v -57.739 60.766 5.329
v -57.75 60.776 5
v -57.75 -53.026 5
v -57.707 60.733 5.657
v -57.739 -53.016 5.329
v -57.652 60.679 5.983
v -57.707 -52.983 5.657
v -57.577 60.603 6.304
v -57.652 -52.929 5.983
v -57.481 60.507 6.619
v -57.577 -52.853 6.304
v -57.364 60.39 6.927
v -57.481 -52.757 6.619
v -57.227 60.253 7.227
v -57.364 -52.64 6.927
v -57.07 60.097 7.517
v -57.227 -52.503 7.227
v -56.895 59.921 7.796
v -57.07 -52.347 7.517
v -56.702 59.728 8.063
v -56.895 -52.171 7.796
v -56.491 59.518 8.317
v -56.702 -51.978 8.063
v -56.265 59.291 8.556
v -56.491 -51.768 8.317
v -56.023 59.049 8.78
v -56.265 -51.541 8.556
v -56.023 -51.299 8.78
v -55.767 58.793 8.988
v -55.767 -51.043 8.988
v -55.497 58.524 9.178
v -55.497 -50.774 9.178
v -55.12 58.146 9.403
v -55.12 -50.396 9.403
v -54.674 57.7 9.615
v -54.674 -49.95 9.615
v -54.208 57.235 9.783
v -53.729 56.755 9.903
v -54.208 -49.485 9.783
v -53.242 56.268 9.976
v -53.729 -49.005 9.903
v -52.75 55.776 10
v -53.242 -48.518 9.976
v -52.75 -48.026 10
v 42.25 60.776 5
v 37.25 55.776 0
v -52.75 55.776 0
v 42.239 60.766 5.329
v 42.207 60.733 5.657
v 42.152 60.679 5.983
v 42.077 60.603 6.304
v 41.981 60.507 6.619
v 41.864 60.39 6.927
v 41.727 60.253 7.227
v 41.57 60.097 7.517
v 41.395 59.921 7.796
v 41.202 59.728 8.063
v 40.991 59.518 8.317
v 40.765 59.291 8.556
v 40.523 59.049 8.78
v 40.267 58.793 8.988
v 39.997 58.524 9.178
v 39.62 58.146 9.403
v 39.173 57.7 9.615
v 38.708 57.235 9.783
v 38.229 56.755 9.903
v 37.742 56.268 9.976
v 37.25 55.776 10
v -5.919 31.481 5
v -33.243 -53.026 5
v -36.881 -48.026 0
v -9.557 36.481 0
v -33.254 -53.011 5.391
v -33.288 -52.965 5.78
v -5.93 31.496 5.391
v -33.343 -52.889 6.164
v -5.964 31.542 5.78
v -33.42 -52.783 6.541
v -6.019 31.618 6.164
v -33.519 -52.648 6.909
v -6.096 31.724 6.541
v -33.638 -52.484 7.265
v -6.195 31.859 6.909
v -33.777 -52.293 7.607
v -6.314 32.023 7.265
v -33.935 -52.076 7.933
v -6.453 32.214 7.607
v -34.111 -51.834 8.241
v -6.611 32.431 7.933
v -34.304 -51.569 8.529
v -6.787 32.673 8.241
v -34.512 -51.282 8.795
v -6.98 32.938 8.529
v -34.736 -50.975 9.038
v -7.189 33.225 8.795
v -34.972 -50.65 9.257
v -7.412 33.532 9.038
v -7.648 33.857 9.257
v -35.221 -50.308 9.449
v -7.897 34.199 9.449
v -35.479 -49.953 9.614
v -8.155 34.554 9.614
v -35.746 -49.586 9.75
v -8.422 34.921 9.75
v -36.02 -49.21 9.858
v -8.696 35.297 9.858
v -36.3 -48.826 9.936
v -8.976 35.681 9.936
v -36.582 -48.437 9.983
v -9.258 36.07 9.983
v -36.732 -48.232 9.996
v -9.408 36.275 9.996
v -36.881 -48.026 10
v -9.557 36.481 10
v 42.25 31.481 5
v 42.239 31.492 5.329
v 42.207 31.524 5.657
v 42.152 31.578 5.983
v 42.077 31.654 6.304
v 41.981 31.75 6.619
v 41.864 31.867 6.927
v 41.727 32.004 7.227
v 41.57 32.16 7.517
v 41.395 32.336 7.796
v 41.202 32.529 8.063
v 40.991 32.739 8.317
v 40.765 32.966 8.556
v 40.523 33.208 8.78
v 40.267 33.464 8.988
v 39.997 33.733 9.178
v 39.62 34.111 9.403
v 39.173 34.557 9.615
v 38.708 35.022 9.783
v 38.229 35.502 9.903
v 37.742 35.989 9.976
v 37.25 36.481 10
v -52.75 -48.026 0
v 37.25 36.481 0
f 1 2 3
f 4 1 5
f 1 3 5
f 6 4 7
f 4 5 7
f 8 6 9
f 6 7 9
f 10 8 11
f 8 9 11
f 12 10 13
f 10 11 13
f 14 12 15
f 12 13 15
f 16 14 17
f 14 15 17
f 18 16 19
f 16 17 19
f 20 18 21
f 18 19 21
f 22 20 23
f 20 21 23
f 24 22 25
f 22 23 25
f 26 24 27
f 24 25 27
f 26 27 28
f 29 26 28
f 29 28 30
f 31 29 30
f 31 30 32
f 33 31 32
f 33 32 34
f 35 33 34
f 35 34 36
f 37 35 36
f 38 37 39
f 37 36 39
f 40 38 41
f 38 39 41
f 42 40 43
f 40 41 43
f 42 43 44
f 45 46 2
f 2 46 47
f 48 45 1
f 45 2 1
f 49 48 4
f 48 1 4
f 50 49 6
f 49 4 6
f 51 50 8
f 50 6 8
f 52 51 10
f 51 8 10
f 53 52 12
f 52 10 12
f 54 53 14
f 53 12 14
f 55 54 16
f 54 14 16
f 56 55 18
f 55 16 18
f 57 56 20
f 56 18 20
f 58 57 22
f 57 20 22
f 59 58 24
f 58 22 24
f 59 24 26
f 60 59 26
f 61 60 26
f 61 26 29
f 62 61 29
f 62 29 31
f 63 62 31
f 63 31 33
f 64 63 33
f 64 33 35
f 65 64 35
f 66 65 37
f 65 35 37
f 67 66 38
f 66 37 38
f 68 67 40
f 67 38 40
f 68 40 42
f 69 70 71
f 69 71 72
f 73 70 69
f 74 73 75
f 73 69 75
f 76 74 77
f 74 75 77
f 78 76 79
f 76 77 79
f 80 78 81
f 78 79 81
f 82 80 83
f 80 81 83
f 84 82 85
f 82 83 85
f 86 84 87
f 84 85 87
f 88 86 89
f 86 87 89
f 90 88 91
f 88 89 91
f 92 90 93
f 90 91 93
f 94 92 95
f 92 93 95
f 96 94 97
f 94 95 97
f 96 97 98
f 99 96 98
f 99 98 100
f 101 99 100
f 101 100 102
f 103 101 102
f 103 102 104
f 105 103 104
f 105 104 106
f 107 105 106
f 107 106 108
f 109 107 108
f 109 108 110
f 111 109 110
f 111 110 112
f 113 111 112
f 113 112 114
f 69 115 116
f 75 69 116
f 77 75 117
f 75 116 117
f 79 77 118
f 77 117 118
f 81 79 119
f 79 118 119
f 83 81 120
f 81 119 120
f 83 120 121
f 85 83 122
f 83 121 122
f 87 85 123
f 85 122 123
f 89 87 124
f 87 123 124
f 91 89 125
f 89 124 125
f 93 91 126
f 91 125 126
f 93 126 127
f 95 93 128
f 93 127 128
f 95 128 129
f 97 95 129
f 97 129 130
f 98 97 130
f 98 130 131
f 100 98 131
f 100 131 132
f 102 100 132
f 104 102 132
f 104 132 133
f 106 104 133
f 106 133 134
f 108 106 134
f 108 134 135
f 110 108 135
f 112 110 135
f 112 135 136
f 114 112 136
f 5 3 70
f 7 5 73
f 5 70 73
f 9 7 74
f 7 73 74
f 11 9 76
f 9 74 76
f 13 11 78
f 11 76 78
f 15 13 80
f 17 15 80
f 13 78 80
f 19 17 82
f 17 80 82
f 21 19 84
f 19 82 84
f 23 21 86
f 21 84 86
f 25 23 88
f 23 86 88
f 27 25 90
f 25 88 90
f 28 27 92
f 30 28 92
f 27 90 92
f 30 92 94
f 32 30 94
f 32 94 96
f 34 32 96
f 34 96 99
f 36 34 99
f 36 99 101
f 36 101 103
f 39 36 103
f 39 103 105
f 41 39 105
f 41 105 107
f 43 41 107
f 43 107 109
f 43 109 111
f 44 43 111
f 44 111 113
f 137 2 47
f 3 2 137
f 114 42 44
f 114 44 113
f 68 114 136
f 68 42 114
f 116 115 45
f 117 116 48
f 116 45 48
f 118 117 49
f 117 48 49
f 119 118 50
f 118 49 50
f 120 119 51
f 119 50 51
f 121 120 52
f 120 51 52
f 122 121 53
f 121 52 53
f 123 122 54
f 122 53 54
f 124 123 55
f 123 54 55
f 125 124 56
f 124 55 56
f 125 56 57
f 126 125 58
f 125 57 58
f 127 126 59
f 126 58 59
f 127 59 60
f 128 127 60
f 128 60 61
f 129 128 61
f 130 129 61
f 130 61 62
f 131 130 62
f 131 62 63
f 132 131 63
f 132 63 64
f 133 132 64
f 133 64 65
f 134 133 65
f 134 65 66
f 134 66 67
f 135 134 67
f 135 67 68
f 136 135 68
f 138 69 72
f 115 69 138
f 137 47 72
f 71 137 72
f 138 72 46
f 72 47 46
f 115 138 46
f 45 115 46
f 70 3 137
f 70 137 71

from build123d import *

# Parameters (mm, degrees)
F1_DEPTH = 10
F2_R     = 5
F3_SIZE  = 4.99999


# Not quite as in the source:
# - a fillet or chamfer is up to 0.001 mm smaller than in the source, because OpenCascade refuses the exact size


with BuildPart() as f1:
    # F0 (on Top) → F1 (new body)
    with BuildSketch(Plane.XY):
        Polygon((42.2499991953, 60.7764059144), (-57.7500008047, 60.7764059144), (-57.7500008047, -53.026408835), (-33.2429584743, -53.026408835), (-5.9190154745, 31.4806343348), (42.2499991953, 31.4806343348), align=None)
    extrude(amount=F1_DEPTH)

    # F2
    f2_edges = [f1.edges().sort_by_distance(p)[0] for p in [
        (-57.750001, 3.874999, 10),
        (-19.580987, -10.772887, 10),
        (-45.49648, -53.026409, 10),
        (18.165492, 31.480634, 10),
        (-7.750001, 60.776406, 10),
        (42.249999, 46.12852, 10),
    ]]
    fillet(f2_edges, radius=F2_R)

    # F3 (size 5 in the source; OpenCascade refuses exactly that, so slightly less here)
    f3_edges = [f1.edges().sort_by_distance(p)[0] for p in [
        (18.165492, 31.480634, 0),
        (42.249999, 46.12852, 0),
        (-7.750001, 60.776406, 0),
        (-57.750001, 3.874999, 0),
        (-45.49648, -53.026409, 0),
        (-19.580987, -10.772887, 0),
    ]]
    chamfer(f3_edges, length=F3_SIZE)


solid = f1.part
